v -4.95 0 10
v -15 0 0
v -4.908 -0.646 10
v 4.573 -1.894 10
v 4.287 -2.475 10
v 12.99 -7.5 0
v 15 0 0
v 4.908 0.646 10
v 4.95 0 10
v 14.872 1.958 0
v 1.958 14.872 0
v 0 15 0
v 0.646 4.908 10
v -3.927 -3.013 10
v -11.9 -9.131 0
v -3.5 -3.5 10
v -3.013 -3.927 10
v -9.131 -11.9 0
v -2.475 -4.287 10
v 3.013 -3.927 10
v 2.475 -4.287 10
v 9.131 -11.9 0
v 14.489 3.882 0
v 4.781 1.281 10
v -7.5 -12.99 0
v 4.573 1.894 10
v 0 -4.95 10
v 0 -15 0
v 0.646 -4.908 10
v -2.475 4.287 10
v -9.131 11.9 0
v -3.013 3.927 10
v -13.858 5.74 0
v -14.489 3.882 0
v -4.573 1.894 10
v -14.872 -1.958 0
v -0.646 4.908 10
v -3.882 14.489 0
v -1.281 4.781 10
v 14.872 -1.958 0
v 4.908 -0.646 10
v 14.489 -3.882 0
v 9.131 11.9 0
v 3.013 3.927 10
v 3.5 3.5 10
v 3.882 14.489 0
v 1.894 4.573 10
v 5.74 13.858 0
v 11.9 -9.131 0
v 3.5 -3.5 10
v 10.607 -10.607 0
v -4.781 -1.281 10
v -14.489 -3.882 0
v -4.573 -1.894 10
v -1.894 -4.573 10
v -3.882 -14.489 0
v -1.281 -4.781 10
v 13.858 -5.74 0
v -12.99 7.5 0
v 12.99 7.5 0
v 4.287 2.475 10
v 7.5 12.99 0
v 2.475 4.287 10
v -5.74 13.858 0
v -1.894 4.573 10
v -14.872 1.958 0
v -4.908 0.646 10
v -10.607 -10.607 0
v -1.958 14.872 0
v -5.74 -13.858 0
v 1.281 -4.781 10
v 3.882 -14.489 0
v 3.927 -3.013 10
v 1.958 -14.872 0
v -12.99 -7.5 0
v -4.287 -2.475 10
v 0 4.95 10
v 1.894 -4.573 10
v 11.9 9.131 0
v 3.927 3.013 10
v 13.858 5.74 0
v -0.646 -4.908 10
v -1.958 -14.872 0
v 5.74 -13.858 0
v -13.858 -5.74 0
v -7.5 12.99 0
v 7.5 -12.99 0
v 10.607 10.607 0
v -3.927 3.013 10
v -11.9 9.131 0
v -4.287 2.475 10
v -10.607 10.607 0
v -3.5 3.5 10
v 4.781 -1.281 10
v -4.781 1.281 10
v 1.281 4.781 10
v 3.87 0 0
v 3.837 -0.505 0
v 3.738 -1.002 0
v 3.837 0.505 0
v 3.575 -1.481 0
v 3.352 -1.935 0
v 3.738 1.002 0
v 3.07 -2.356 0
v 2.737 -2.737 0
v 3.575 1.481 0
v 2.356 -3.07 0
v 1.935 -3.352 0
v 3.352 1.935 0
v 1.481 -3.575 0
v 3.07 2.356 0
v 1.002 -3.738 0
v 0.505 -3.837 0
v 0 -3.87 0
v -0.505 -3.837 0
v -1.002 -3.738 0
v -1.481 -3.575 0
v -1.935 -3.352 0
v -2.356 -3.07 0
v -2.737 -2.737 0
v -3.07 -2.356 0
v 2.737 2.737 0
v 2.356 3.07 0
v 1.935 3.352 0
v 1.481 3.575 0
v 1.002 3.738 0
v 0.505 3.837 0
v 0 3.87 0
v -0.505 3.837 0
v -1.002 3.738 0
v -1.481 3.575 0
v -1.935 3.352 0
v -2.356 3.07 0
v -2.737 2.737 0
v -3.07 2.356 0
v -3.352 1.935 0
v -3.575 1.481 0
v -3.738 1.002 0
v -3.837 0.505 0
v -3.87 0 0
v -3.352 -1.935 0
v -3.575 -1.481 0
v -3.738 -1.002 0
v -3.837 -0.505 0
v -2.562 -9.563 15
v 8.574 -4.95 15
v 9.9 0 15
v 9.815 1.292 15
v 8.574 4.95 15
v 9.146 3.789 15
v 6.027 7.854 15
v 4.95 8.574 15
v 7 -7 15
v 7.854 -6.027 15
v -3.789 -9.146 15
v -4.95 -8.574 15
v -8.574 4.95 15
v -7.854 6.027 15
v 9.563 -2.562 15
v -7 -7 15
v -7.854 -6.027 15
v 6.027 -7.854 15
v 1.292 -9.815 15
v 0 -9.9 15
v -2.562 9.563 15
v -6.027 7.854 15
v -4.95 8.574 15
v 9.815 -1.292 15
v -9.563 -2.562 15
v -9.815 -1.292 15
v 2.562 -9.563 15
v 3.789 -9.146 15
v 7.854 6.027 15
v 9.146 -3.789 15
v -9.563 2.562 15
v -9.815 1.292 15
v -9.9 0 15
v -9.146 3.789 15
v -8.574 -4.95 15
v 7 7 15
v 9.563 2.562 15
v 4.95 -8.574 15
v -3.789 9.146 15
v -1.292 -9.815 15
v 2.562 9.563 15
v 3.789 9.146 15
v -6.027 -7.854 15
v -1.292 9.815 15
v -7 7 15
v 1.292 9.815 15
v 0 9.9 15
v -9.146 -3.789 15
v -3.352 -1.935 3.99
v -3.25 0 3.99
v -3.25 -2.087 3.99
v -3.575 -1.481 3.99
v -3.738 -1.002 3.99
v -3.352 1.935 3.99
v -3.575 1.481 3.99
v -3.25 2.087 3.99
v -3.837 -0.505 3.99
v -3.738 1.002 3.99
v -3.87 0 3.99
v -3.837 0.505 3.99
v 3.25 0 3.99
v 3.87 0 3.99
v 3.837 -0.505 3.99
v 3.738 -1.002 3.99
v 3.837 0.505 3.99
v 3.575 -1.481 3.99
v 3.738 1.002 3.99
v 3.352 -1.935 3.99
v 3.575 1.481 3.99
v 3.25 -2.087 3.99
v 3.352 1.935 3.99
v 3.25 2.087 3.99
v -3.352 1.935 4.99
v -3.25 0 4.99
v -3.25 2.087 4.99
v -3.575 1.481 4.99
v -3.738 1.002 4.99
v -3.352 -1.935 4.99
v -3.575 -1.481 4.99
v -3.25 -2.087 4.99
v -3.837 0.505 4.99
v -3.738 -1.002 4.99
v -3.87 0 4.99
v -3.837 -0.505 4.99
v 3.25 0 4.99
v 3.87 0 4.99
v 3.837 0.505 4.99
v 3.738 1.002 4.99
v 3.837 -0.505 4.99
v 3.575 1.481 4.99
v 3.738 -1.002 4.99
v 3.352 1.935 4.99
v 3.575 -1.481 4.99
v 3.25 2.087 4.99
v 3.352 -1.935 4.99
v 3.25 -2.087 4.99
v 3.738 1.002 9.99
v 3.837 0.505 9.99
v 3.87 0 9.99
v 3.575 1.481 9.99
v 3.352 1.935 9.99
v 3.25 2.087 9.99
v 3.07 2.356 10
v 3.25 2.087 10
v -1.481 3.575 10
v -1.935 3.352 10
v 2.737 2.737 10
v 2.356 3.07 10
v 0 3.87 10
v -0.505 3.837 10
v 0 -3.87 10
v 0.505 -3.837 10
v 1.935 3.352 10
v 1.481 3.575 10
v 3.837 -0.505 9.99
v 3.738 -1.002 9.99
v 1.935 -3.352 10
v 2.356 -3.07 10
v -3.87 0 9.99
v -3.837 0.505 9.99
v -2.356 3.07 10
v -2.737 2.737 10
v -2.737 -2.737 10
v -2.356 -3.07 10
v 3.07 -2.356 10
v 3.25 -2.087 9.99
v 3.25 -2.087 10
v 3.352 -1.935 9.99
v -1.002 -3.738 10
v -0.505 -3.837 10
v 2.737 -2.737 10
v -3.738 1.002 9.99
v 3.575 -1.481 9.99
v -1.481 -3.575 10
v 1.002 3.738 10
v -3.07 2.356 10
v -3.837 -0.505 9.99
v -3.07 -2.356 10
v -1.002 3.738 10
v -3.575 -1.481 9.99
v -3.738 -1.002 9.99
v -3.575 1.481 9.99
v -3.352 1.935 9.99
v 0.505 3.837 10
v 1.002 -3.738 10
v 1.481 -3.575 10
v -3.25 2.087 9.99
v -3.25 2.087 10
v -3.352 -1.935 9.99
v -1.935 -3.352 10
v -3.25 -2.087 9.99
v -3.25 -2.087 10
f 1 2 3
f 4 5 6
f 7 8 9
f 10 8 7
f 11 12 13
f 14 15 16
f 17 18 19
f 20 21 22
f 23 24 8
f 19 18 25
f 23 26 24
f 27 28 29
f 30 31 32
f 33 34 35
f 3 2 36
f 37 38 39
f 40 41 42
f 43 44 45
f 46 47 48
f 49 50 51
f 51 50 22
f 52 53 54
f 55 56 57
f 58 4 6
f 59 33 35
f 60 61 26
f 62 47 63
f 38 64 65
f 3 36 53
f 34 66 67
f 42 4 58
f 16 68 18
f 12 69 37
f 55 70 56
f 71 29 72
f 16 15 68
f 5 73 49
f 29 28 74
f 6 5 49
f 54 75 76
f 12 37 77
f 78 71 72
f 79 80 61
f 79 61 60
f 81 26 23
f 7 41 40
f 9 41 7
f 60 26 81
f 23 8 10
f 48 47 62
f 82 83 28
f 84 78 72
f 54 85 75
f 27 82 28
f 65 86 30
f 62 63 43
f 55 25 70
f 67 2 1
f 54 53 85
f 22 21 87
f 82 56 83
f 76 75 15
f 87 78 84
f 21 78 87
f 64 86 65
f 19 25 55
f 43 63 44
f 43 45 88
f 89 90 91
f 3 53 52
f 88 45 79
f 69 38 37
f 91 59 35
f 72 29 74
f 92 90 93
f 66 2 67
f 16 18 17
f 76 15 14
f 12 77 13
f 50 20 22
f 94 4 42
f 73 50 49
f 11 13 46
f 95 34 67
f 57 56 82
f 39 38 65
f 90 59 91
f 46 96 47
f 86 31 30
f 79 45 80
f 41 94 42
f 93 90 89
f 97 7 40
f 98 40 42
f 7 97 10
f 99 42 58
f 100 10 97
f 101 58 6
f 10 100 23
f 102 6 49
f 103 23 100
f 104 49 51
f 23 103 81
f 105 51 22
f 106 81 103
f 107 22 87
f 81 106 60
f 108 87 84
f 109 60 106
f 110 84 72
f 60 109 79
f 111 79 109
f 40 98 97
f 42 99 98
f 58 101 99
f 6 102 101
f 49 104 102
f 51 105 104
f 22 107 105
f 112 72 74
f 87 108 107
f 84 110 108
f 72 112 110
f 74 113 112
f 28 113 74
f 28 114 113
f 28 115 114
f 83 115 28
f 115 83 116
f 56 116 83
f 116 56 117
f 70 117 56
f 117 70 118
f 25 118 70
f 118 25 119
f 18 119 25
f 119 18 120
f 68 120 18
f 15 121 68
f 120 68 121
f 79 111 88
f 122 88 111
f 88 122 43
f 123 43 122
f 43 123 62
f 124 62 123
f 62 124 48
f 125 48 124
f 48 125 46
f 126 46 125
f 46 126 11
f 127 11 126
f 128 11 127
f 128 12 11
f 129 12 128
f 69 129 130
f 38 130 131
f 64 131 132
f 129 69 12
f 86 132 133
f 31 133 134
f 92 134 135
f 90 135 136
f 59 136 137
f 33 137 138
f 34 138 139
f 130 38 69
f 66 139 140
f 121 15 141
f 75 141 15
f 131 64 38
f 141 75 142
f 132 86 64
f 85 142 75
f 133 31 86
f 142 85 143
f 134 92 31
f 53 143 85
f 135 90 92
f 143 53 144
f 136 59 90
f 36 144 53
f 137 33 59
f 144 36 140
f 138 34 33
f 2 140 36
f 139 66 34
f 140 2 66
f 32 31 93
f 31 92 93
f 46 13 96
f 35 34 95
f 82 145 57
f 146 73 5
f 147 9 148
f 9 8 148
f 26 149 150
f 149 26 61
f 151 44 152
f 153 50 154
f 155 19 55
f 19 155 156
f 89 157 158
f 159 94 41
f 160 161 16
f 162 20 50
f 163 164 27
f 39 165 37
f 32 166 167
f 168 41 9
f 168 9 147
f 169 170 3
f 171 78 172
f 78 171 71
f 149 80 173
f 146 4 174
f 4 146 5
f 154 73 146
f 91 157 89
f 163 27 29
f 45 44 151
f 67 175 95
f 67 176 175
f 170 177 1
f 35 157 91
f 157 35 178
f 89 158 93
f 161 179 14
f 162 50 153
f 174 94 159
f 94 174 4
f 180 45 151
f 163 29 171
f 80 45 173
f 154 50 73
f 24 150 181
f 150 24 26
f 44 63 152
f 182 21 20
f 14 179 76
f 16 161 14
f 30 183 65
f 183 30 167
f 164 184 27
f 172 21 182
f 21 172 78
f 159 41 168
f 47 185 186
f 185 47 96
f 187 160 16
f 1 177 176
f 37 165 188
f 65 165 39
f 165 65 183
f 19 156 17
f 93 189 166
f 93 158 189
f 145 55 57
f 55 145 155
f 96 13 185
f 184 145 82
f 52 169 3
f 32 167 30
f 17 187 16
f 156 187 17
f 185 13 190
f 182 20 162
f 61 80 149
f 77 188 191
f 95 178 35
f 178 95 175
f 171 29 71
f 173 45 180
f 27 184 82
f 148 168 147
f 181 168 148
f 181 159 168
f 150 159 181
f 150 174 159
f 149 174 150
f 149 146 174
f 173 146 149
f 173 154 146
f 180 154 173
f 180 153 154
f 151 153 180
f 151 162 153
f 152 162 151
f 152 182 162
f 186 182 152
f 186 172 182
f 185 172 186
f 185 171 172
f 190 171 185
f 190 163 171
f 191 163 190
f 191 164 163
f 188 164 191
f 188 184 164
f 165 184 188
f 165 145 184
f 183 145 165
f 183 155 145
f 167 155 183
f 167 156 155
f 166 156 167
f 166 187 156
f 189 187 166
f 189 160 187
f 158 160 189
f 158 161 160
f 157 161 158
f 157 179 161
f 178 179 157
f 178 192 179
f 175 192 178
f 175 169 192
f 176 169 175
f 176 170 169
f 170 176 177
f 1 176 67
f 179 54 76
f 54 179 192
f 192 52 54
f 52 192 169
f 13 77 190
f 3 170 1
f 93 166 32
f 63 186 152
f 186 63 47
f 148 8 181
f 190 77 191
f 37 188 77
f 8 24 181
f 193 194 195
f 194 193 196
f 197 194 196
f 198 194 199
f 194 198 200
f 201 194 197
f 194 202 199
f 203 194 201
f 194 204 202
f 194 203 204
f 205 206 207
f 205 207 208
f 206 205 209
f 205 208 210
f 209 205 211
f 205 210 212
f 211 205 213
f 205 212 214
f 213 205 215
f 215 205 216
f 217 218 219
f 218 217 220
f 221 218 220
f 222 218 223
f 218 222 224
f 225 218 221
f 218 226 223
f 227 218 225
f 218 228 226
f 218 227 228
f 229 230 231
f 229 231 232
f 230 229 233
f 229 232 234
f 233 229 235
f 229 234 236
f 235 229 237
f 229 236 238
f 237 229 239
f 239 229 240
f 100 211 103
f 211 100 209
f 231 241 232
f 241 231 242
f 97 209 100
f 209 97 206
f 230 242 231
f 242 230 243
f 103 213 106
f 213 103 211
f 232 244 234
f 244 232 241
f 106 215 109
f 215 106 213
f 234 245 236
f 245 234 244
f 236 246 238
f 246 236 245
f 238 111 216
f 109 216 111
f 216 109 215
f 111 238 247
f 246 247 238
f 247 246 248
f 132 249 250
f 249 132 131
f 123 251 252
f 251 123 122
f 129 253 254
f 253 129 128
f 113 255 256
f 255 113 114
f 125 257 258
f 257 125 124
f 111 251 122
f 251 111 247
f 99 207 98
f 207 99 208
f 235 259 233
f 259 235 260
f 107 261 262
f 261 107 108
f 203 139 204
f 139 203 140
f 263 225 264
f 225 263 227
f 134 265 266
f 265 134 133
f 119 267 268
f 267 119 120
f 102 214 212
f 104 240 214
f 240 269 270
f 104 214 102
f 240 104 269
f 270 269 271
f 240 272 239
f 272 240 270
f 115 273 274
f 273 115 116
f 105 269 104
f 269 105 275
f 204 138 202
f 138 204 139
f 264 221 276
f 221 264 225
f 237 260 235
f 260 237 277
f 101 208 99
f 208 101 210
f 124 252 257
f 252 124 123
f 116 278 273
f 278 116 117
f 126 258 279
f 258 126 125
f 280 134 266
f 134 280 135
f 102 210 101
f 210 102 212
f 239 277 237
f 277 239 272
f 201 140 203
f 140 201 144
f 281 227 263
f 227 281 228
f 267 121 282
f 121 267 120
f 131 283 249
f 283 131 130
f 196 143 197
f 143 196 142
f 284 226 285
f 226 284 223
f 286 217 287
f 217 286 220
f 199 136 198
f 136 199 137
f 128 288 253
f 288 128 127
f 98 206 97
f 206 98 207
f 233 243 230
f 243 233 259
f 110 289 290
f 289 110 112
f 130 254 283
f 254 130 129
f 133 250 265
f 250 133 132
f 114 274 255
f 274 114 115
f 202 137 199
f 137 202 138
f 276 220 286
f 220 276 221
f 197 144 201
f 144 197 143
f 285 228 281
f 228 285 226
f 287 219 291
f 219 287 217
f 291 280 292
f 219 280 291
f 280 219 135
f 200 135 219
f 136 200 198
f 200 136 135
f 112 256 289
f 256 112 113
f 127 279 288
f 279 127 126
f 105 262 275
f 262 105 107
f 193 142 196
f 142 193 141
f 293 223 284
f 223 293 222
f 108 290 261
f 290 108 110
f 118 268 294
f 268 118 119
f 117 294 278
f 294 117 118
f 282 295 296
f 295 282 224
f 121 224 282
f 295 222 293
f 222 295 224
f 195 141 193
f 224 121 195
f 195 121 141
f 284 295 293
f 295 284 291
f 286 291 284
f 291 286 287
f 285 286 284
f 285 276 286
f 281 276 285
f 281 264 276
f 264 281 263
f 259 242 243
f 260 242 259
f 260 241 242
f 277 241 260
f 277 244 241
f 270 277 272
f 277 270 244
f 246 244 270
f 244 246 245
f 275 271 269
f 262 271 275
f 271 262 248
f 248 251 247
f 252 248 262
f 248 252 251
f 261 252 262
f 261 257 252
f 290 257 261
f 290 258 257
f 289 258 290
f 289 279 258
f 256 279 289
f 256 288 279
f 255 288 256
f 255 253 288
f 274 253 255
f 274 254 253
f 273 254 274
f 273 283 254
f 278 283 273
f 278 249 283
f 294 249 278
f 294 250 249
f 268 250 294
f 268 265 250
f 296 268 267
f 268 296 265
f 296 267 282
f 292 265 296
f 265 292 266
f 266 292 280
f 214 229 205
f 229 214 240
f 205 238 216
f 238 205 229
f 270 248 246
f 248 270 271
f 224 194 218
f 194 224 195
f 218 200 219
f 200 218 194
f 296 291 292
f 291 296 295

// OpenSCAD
$fn=48;

peg=7.44;
pegClearance=0.3;
pegHole=peg+pegClearance;

pegHeight=10;
pegRidgeBottom=7;
pegRidgeTop=4;
pegRidgeDiameter=6.5;
pegRidgeSpace=6.5;

handleDiameter=30;


module handle()
{difference() {
	union() {
		cylinder(d1=handleDiameter,d2=handleDiameter*0.33,h=pegHeight);
		translate([0,0,pegHeight])
			cylinder(d1=handleDiameter*0.33,d2=handleDiameter*0.66,h=pegHeight*0.5);
	}
	translate([0,0,-0.01])
	peg();
	pegSpace();
}}

module peg()
{difference() {
	cylinder(d=pegHole,h=pegHeight);
	translate([0,0,pegHeight-pegRidgeBottom+1])
		donut(i=pegRidgeDiameter,o=pegHole*2,h=1);
	
}}


module pegSpace()
{difference() {
	cylinder(d=pegHole,h=pegHeight);
	translate([(pegRidgeSpace/2),-pegHole,-0.01])
		cube([pegHole,pegHole*2,pegHeight*2]);
	
	translate([(-pegHole-pegRidgeSpace*0.5),-pegHole,-0.01])
		cube([pegHole,pegHole*2,pegHeight*2]);
	
}}

module donut(i,o,h)
{difference(){
	cylinder(d=o,h=h);
	cylinder(d=i,h=h*2);
}}

handle();
